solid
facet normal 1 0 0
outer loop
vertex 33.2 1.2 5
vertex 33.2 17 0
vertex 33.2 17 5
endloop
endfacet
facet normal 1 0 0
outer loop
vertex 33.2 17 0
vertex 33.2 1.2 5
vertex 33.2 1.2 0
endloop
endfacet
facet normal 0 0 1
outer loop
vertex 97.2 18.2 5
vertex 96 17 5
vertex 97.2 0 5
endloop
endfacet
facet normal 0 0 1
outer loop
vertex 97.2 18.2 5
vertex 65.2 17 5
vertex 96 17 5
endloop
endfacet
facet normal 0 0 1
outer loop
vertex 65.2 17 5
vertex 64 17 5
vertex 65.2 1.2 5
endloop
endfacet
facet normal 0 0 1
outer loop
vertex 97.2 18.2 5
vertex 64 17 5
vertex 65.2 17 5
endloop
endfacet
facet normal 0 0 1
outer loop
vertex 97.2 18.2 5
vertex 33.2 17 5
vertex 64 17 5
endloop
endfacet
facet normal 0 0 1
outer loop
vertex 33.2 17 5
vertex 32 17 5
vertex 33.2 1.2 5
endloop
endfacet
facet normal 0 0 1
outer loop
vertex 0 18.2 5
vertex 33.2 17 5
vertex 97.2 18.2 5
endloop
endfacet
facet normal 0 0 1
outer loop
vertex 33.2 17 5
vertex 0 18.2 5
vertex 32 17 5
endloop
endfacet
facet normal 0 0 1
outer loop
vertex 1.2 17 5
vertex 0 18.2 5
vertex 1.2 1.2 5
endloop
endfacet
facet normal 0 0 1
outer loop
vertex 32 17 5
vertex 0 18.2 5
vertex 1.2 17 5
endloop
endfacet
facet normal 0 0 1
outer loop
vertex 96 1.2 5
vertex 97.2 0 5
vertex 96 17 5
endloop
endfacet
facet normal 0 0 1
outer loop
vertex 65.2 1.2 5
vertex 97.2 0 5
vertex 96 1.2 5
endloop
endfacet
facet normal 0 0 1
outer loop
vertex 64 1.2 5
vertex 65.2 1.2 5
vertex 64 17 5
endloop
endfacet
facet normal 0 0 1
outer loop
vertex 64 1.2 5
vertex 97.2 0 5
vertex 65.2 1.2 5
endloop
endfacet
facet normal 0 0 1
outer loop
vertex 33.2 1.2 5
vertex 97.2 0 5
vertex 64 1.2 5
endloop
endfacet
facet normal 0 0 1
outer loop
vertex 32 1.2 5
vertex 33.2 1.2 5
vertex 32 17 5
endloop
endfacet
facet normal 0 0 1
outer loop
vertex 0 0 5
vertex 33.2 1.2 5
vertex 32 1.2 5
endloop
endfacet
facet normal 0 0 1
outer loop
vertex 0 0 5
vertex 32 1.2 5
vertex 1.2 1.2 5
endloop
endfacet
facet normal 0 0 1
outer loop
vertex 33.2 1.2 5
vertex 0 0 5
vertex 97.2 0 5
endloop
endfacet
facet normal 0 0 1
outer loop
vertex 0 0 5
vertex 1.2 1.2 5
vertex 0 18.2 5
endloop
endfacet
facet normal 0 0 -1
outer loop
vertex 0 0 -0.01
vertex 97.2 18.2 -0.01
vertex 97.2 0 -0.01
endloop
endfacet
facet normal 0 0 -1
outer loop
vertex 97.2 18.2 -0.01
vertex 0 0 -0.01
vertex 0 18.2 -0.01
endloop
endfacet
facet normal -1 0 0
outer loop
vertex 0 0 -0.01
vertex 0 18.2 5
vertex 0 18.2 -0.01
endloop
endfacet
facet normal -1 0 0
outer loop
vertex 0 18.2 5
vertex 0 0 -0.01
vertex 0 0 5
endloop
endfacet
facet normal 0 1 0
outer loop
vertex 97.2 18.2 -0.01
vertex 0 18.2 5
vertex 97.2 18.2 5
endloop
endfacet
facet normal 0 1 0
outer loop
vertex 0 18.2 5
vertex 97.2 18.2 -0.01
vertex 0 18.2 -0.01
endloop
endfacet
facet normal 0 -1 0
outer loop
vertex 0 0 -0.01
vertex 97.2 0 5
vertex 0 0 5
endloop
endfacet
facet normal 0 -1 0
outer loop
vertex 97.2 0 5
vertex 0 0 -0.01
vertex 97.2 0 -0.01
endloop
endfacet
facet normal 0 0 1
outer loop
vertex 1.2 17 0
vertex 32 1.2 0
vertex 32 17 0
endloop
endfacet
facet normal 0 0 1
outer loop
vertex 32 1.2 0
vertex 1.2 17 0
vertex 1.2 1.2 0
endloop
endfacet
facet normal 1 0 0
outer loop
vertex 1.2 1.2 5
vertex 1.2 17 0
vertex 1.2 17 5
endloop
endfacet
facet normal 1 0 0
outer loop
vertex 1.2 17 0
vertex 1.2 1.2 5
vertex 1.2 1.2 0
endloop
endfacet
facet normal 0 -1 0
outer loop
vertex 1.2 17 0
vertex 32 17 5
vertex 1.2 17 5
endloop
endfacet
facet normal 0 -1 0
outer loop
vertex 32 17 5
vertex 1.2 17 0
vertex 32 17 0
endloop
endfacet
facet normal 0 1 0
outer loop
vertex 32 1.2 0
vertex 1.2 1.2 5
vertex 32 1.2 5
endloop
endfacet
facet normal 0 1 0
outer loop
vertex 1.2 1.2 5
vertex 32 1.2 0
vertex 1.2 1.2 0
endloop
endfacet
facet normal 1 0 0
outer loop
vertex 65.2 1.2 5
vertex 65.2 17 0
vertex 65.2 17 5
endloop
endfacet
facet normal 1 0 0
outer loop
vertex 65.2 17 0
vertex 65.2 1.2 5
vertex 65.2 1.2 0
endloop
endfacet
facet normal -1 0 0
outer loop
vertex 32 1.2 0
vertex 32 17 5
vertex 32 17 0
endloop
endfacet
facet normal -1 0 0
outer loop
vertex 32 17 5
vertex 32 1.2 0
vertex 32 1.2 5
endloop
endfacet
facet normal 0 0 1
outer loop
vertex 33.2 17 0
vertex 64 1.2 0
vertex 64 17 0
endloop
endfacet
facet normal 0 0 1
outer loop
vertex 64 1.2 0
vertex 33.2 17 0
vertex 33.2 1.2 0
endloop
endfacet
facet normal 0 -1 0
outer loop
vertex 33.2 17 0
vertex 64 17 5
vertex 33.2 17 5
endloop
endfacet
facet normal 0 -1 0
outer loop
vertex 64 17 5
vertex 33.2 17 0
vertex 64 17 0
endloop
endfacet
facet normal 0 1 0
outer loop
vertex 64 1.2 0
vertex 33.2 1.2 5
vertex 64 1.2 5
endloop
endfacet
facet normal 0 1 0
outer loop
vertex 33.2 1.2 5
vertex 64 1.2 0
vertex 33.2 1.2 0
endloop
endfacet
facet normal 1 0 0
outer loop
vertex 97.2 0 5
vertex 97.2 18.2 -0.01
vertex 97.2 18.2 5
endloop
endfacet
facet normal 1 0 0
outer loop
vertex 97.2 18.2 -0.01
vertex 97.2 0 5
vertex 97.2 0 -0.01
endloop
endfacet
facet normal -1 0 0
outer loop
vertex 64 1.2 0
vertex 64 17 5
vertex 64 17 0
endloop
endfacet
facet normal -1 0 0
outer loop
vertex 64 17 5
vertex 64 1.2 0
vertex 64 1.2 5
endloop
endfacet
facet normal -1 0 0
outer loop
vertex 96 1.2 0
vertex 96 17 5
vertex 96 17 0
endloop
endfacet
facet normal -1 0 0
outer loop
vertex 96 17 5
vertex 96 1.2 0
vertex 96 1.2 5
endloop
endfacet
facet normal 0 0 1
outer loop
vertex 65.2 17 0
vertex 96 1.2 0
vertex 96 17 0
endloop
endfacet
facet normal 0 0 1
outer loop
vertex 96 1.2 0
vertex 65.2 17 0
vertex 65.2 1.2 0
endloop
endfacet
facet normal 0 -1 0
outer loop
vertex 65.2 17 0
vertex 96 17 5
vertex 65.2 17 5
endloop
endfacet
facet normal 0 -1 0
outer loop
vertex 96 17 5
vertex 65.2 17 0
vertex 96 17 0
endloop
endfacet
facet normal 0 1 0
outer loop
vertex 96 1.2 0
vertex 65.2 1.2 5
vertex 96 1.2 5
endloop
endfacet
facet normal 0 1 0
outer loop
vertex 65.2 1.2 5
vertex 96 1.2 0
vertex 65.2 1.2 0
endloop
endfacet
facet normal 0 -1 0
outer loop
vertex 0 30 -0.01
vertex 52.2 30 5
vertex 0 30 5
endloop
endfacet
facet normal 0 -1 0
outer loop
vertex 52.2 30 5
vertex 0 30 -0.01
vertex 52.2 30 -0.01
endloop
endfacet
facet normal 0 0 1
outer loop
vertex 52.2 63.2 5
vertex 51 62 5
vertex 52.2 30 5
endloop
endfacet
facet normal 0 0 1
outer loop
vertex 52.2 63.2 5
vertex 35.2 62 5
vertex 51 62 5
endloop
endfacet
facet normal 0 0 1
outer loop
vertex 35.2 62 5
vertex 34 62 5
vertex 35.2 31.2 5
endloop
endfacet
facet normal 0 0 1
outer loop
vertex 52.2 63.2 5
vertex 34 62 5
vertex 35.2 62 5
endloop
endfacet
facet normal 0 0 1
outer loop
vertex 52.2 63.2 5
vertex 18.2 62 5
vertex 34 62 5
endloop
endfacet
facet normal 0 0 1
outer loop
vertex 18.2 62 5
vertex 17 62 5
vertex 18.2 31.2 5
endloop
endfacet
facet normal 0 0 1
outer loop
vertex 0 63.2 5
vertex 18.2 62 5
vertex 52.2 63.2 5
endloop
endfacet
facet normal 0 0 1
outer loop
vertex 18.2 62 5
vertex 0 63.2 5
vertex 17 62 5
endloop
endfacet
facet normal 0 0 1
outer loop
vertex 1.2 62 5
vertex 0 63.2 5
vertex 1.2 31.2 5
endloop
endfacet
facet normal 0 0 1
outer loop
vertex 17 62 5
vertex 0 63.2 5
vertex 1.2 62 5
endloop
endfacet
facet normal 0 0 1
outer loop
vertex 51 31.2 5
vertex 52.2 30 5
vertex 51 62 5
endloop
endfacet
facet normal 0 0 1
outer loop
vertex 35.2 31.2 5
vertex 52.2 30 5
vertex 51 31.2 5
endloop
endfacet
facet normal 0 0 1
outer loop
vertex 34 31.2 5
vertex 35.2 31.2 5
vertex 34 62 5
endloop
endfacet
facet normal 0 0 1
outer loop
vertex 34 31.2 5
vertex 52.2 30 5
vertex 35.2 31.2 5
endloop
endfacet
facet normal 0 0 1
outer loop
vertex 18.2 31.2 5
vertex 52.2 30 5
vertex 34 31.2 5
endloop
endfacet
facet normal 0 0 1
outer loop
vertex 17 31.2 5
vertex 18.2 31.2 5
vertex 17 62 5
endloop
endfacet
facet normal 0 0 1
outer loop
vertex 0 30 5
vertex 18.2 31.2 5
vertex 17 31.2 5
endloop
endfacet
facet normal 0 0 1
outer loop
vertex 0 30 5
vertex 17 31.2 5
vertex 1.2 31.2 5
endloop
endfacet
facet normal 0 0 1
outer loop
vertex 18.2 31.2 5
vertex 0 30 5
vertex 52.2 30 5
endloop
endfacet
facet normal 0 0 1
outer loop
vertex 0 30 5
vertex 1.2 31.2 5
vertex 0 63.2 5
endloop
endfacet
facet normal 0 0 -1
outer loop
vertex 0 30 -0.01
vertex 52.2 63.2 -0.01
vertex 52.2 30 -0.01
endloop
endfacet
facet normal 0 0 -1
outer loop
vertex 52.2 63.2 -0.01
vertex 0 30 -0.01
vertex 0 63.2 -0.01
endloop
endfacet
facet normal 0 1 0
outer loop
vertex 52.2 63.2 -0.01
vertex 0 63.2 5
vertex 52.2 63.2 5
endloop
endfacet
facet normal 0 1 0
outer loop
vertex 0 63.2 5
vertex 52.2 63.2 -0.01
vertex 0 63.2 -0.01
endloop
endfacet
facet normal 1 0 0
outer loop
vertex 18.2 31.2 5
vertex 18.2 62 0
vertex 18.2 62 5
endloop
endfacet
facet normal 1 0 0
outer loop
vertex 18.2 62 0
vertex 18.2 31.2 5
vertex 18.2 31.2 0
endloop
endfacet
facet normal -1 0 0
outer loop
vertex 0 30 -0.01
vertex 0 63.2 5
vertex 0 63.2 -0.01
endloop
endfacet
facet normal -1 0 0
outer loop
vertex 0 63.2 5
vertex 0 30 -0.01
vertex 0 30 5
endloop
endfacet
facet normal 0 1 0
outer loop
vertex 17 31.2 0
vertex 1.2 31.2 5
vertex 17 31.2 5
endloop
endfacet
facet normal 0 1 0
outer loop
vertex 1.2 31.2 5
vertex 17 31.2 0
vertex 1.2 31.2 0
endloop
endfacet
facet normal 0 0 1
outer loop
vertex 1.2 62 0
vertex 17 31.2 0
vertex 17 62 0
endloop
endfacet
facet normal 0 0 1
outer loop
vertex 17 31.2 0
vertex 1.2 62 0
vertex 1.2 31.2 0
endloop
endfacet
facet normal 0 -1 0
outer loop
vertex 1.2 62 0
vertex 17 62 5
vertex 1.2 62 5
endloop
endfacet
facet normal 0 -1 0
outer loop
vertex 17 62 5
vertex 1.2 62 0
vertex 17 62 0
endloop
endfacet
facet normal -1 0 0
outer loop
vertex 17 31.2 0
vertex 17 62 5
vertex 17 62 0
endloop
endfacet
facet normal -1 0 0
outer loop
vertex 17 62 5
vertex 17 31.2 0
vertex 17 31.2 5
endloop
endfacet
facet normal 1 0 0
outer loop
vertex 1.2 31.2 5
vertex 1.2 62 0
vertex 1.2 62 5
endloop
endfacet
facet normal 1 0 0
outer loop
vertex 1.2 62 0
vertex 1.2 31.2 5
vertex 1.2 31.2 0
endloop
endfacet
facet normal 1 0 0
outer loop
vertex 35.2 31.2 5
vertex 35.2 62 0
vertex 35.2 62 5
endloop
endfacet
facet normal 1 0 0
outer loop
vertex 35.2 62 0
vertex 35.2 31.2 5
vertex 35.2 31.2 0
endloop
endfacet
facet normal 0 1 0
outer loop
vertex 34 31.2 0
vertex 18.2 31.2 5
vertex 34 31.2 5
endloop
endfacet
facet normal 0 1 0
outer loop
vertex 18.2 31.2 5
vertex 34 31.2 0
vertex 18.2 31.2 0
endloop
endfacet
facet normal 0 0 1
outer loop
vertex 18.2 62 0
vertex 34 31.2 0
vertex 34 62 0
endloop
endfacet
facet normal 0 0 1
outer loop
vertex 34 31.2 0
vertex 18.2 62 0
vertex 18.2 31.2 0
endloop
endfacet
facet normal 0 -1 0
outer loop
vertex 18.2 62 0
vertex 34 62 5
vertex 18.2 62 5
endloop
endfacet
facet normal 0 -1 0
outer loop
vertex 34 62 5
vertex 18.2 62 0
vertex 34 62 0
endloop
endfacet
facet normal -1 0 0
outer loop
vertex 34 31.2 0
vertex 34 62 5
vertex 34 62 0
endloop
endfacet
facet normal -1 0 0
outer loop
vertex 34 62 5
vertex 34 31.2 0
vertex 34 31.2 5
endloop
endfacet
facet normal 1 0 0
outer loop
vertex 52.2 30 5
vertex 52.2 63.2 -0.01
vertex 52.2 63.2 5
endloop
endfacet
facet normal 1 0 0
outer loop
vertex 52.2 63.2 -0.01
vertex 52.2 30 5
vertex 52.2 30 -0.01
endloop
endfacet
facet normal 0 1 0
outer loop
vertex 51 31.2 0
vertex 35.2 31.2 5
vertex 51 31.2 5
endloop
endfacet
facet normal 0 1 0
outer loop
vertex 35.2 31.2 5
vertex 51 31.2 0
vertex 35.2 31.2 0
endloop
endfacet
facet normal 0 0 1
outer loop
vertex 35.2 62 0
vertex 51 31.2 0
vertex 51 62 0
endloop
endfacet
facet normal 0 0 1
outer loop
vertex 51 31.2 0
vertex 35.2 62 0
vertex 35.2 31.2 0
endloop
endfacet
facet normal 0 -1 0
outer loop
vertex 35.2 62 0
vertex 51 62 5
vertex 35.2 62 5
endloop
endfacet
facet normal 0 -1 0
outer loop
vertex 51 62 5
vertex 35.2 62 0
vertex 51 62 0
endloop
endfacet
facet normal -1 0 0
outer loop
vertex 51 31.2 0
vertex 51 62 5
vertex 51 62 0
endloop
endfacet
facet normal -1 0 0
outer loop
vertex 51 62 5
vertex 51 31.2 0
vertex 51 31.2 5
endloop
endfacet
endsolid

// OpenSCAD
// file: ../../Base/Alignment.scad
// Fischertechnik Box Foundation
// Geometry Helpers Alignment

include <PlacementOptions.scad>

// getAlignedX(elementWidth, spaceWidth, align=AlignRight, offset=0)
// Gets the aligned X offset of an element with the given
// width in the given space.
// elementWidth = The width of the element to positon
// spaceWidth = The space where the element should be aligned
// align = 0 AlignLeft, 1 AlignCenter, 2 AlignRight
// offset = an optional offset from the aligned position. When
// aligned left or centered, then positive values are in X direction.
// When aligned right then positive values are in negative X direction.

function getAlignedX(elementWidth, spaceWidth, align=AlignRight, offset=0) =
    (align == AlignLeft) ?
        offset :
        ((align == AlignCenter) ?
        (spaceWidth - elementWidth)/2 + offset :
        spaceWidth - offset - elementWidth);

// getAlignedY(elementDepth, spaceDepth, align=AlignTop, offset=0)
// Gets the aligned Y offset of an element with the given
// depth in the given space.
// elementDepth = The depth of the element to positon
// spaceDepth = The space where the element should be aligned
// align = 0 AlignBottom, 1 AlignCenter, 2 AlignTop
// offset = an optional offset from the aligned position. When
// aligned bottom or centered, then positive values are in Y direction.
// When aligned top then positive values are in negative Y direction.

function getAlignedY(elementDepth, spaceDepth, align=AlignTop, offset=0) =
    (align == AlignBottom) ?
        offset :
        ((align == AlignCenter) ?
        (spaceDepth - elementDepth)/2 + offset :
        spaceDepth - offset - elementDepth);
// file: ../../Base/Boxes.scad
// Fischertechnik Box Foundation
// Pre-designed Boxes

use <Constants.scad>

include <PlacementOptions.scad>

box190Width = 190;
box190Depth = 130;
box130Width = 130;
box130Depth = 95;
boxUsageHeight = 33.9;
boxWallThickness = 2.4;
boxBaseThickness = 1.0;
boxWebWidth = 3.0;

// getBoxWallThickness()
// Gets the wall thickness of a Fischertechnik Box

function getBoxWallThickness() = boxWallThickness;

// Gets the usable height of a fischertechnik box
function getBoxUsageHeight() = boxUsageHeight;

// Gets the thickness of the Fischertechnik box base.
function getBoxBaseThickness() = boxBaseThickness;

// Gets the width of a box web
function getBoxWebWidth() = boxWebWidth;

// Gets the usable inner space of a Box 190 as an x/y-list
function getBox190Space() = [
    box190Width - 2*getBoxWallThickness(), 
    box190Depth - 2*getBoxWallThickness() ];

// Imports the Fischertechnik empty box 130x190 mm and places it at position 0,0
// 190x130 are the outer sizes, the inner space is slightly smaller. Use getBox190Space() to get the inner sizes.
// This module needs the STL file "Fischertechnik Box 130x190.stl" in the library path.
// The box is positioned that the usable inner space is at the 0,0,0 position. The

module Box190() {
    translate([-getBoxWallThickness(),-getBoxWallThickness(),-getBoxBaseThickness()])
        import("Fischertechnik Box 130x190.stl", convexity=3);
}

// Gets the usable inner space of a Box 130 as an x/y-list
function getBox130Space() = [
    box130Width - 2*getBoxWallThickness(), 
    box130Depth - 2*getBoxWallThickness() ];

// Imports the Fischertechnik empty box 95x130 mm and places it at position 0,0
// 190x130 are the outer sizes, the inner space is slightly smaller. Use getBox190Space() to get the inner sizes.
// This module needs the STL file "Fischertechnik Box 95x130.stl" in the library path.
// The box is positioned that the usable inner space is at the 0,0,0 position. The

module Box130() {
    translate([-getBoxWallThickness(),-getBoxWallThickness(),-getBoxBaseThickness()])
        import("Fischertechnik Box 95x130.stl", convexity=3);
}

// Creates a web at the specified box walls
// corner 0 = LowerLeft, 1 = UpperLeft, 2 = UpperRight, 3 = LowerRight
// side 0 = LeftOfCorner, 1 = RightOfCorner
// distance = Distance in mm from the corner
// box = inner width and depth of the box (default: Box 190)
// webWidth = length of the web (default is 3 mms)
// webThickness = thickness of the web (default is 1 mm)

module BoxWeb(corner, side, distance, box=getBox190Space(), webWidth=getBoxWebWidth(), webThickness=1.0) {
    sink = getBoxWallThickness()/2;

    width = (corner % 2 == 0) ? 
            (side == LeftOfCorner ? webWidth : webThickness) :
            (side == LeftOfCorner ? webThickness : webWidth);

    depth = (corner % 2 == 0) ? 
            (side == RightOfCorner ? webWidth : webThickness) :
            (side == RightOfCorner ? webThickness : webWidth);
    
    xDiff = corner == LowerLeft ? 
                (side == LeftOfCorner ? -sink : distance) :
            (corner == UpperLeft ?                
                (side == LeftOfCorner ? distance : -sink) :
            (corner == UpperRight ?
                (side == LeftOfCorner ? box.x-webWidth+sink : box.x-distance-webThickness) :
                (side == LeftOfCorner ? box.x-distance-webThickness: box.x-webWidth+sink)));

    yDiff = corner == LowerLeft ? 
                (side == RightOfCorner ? -sink : distance) :
            (corner == UpperLeft ?
                (side == RightOfCorner ? box.y-distance : box.y-webWidth+sink) :
            (corner == UpperRight ?
                (side == RightOfCorner ? box.y-webWidth+sink : box.y-distance) :
                (side == RightOfCorner ? distance : -sink)));
    
    translate([xDiff, yDiff, -getExcess()])
        cube([width, depth, boxUsageHeight + 2*getExcess()]);
}
// file: ../../Base/Rotation.scad
// Fischertechnik Box Foundation
// Geometry Helpers Rotation

include <PlacementOptions.scad>

// getRotatedSpace(space, rotation=NoRotation)
// Rotates the space dependent on the specified rotation

function getRotatedSpace(space, rotation=NoRotation) = [
    (rotation == Rotate90 || rotation == Rotate270) ? space.y : space.x,
    (rotation == Rotate90 || rotation == Rotate270) ? space.x : space.y
];

// Rotates the given space around the fixed left lower corner
// space = the space the children needs as width/depth list [width,depth]
// rotation = 0 Rotate0 degrees, 1 Rotate90 degrees, 2 Rotate180 degrees, 3 Rotate270 degrees (equivalent to -90)

module RotateFix(space, rotation=Rotate0) {
    dy = (rotation == Rotate0 || rotation == Rotate270) ? 0 :
        (rotation == Rotate90) ? space.x :
        space.y;
    dx = (rotation < Rotate180) ? 0 :
        (rotation == Rotate180) ? space.x :
        space.y;
    
    translate([dx, dy, 0])
        rotate([0, 0, rotations[rotation]])
            children();
}
// file: ../../Base/Placement.scad
// Fischertechnik Box Foundation
// Geometry Helpers Placement

use <Constants.scad>
use <Alignment.scad>
use <Rotation.scad>
use <Boxes.scad>

include <PlacementOptions.scad>

// Place(x=0, y=0, elementSpace=[0,0], alignX=AlignLeft, alignY=AlignBottom, rotation=Rotate0, boxSpace=getBox190Space())
// Places the child at the specified position
// y = Y-Position. This is a relative position when an X aligment is specified.
// x = X-Position. This is a relative position when an Y aligment is specified.
// elementSpace = space of the element to be placed [x,y]
// alignX = -1=NoAlign, 0 AlignLeft, 1 AlignCenter, 3 AlignRight (elementSpace and boxSpace required!)
// alignY = -1=NoAlign, 2 AlignBottom, 1 AlignCenter, 4 AlignTop (elementSpace and boxSpace required!)
// rotation = 0 Rotate0 0 degrees, 1 Rotate90 90 degrees, 
// 2 Rotate180 180 degrees, 3 Rotate270 270 degrees (equivalent to -90)
// boxSpace = Inner space of the box where the placement occurs [x,y] - default is Box 190x130 inner space

module Place(x=0, y=0, elementSpace=[0,0], 
  alignX=AlignLeft, alignY=AlignBottom, 
  rotation=NoRotation, boxSpace=getBox190Space()) {

    module Position(x, y, space, rotation=Rotate0) {
        translate([x, y, 0])
            RotateFix(space, rotation)
                children();
    }

    space = getRotatedSpace(elementSpace, rotation);
    alignedX = getAlignedX(space.x, boxSpace.x, alignX, x);
    alignedY = getAlignedY(space.y, boxSpace.y, alignY, y);
    Position(alignedX, alignedY, elementSpace, rotation)
        children();
}

// Center(space=getBox130Space(), elementSpace=[0,0])
// space = Space where the children is centered. For cylinder use centered=true and no elementSpace.
// elementSpace = space of the element to be centered [x,y]

module Center(space=getBox190Space(), elementSpace=[0,0]) {
    Place(elementSpace=elementSpace, boxSpace=space, alignX=AlignCenter, alignY=AlignCenter)
        children();
}

// CenterHorizontal(width=0, y=0, offset=0, space=getBox130Space())
// width = Width of the element to be placed.
// y = Y position of the element
// offset = Offset from the center position (negative will be left of the center)
// space = Space where the element is placed

module CenterHorizontal(width=0, y=0, offset=0, space=getBox190Space()) {
    Place(x=offset, y=y, elementSpace=[width, 0], boxSpace=space, alignX=AlignCenter)
        children(0);
}

// CenterVertical(depth=0, x=0, offset=0, space=getBox130Space())
// depth = Depth of the element to be placed.
// x = X position of the element
// offset = Offset from the center position (negative will be down of the center)
// space = Space where the element is placed

module CenterVertical(depth=0, x=0, offset=0, space=getBox190Space()) {
    Place(x=x, y=offset, elementSpace=[0, depth], boxSpace=space, alignY=AlignCenter)
        children(0);
}

// getIsVertical(align)
// True if the specified alignment needs a vertical orientation for a divider (AlignRight, AlignLeft)

function getIsVertical(align) = (align == AlignRight || align == AlignLeft);

// getIsHorizontal(align)
// True if the specified alignment needs a horizontal orientation for a divider (AlignTop, AlignBottom)

function getIsHorizontal(align) = (align == AlignTop || align == AlignBottom);
// file: ../../Base/Constants.scad
// Fischertechnik Box Foundation
// Constants

// Constant values necessary for multiple elements

// Base constants
dividerThickness = 1.2;
excess = 0.01;
fragments = 90;
tolerance = 0.8;

// Gets the thickness of a divider 
function getDividerThickness() = dividerThickness;

// Gets the excess that is used to merge walls into each other
function getExcess() = excess;

// Gets amount of fragments of a cylinder
function getFragments() = fragments;

// Gets the inner tolerance of a frame to each side
function getTolerance() = tolerance;


// Fischertechnik specific constants
axisDiameter = 4;
axisBottomDiameter = axisDiameter + 1;
standardEdgeDistance = 2.5;
standardWebDistance = 11.5;
standardCornerLength = 15;
tubeWallFactor = 0.8;
smallPartsFrameHeight = 20;

// Gets axis diameter
function getAxisDiameter() = axisDiameter;

// Gets axis bottom diameter for thicker part at the bottom
function getAxisBottomDiameter() = axisBottomDiameter;

// gets the standard distance to the wall of the box for dockable frames with webs
function getStandardEdgeDistance() = standardEdgeDistance;

// gets the standard distance of each web to the corner of the dockable frame
function getStandardWebDistance() = standardWebDistance;

// gets the standard length of the corner walls of a dockable frame
function getStandardCornerLength() = standardCornerLength;

// gets the wall thickness of a tube.
function getTubeWallThickness() = tubeWallFactor * getDividerThickness();

// gets the frame height for docked small parts boxes.
function getSmallPartsFrameHeight() = smallPartsFrameHeight;
// file: ../../Base/PlacementOptions.scad
// Fischertechnik Box Foundation
// Placement Options

// Alignment
NoAlign = 0;
AlignLeft = 1;
AlignBottom = 2;
AlignCenter = 3;
AlignRight = 4;
AlignTop = 5;

// Element rotation degree steps
rotations = [0, -90, -180, -270];

// Rotation
NoRotation = 0;
Rotate0 = 0;
Rotate90 = 1;
Rotate180 = 2;
Rotate270 = 3;

// Docking (seen from above)
NoDock = -1;
DockLeft = 0;
DockTop = 1;
DockRight = 2;
DockCorner = 2;
DockBottom = 3;

// Web corners
LowerLeft = 0;
UpperLeft = 1;
UpperRight = 2;
LowerRight = 3;

// Web position relative to corner
LeftOfCorner = 0;
RightOfCorner = 1;
// main file
// Fischertechnik Box Foundation
// Geometry Helpers Deployment
// Test Merge

use <../../Base/Deployment.scad>
use <../../ModelBase/Simple.scad>

include <../../Base/PlacementOptions.scad>

space = [30, 15, 5];
volume = getFrameOuterVolume(space);

Merge(3, volume, Rotate0)
    Frame(space);

translate([0, 30])
Merge(3, volume, Rotate90)
    Frame(space);
